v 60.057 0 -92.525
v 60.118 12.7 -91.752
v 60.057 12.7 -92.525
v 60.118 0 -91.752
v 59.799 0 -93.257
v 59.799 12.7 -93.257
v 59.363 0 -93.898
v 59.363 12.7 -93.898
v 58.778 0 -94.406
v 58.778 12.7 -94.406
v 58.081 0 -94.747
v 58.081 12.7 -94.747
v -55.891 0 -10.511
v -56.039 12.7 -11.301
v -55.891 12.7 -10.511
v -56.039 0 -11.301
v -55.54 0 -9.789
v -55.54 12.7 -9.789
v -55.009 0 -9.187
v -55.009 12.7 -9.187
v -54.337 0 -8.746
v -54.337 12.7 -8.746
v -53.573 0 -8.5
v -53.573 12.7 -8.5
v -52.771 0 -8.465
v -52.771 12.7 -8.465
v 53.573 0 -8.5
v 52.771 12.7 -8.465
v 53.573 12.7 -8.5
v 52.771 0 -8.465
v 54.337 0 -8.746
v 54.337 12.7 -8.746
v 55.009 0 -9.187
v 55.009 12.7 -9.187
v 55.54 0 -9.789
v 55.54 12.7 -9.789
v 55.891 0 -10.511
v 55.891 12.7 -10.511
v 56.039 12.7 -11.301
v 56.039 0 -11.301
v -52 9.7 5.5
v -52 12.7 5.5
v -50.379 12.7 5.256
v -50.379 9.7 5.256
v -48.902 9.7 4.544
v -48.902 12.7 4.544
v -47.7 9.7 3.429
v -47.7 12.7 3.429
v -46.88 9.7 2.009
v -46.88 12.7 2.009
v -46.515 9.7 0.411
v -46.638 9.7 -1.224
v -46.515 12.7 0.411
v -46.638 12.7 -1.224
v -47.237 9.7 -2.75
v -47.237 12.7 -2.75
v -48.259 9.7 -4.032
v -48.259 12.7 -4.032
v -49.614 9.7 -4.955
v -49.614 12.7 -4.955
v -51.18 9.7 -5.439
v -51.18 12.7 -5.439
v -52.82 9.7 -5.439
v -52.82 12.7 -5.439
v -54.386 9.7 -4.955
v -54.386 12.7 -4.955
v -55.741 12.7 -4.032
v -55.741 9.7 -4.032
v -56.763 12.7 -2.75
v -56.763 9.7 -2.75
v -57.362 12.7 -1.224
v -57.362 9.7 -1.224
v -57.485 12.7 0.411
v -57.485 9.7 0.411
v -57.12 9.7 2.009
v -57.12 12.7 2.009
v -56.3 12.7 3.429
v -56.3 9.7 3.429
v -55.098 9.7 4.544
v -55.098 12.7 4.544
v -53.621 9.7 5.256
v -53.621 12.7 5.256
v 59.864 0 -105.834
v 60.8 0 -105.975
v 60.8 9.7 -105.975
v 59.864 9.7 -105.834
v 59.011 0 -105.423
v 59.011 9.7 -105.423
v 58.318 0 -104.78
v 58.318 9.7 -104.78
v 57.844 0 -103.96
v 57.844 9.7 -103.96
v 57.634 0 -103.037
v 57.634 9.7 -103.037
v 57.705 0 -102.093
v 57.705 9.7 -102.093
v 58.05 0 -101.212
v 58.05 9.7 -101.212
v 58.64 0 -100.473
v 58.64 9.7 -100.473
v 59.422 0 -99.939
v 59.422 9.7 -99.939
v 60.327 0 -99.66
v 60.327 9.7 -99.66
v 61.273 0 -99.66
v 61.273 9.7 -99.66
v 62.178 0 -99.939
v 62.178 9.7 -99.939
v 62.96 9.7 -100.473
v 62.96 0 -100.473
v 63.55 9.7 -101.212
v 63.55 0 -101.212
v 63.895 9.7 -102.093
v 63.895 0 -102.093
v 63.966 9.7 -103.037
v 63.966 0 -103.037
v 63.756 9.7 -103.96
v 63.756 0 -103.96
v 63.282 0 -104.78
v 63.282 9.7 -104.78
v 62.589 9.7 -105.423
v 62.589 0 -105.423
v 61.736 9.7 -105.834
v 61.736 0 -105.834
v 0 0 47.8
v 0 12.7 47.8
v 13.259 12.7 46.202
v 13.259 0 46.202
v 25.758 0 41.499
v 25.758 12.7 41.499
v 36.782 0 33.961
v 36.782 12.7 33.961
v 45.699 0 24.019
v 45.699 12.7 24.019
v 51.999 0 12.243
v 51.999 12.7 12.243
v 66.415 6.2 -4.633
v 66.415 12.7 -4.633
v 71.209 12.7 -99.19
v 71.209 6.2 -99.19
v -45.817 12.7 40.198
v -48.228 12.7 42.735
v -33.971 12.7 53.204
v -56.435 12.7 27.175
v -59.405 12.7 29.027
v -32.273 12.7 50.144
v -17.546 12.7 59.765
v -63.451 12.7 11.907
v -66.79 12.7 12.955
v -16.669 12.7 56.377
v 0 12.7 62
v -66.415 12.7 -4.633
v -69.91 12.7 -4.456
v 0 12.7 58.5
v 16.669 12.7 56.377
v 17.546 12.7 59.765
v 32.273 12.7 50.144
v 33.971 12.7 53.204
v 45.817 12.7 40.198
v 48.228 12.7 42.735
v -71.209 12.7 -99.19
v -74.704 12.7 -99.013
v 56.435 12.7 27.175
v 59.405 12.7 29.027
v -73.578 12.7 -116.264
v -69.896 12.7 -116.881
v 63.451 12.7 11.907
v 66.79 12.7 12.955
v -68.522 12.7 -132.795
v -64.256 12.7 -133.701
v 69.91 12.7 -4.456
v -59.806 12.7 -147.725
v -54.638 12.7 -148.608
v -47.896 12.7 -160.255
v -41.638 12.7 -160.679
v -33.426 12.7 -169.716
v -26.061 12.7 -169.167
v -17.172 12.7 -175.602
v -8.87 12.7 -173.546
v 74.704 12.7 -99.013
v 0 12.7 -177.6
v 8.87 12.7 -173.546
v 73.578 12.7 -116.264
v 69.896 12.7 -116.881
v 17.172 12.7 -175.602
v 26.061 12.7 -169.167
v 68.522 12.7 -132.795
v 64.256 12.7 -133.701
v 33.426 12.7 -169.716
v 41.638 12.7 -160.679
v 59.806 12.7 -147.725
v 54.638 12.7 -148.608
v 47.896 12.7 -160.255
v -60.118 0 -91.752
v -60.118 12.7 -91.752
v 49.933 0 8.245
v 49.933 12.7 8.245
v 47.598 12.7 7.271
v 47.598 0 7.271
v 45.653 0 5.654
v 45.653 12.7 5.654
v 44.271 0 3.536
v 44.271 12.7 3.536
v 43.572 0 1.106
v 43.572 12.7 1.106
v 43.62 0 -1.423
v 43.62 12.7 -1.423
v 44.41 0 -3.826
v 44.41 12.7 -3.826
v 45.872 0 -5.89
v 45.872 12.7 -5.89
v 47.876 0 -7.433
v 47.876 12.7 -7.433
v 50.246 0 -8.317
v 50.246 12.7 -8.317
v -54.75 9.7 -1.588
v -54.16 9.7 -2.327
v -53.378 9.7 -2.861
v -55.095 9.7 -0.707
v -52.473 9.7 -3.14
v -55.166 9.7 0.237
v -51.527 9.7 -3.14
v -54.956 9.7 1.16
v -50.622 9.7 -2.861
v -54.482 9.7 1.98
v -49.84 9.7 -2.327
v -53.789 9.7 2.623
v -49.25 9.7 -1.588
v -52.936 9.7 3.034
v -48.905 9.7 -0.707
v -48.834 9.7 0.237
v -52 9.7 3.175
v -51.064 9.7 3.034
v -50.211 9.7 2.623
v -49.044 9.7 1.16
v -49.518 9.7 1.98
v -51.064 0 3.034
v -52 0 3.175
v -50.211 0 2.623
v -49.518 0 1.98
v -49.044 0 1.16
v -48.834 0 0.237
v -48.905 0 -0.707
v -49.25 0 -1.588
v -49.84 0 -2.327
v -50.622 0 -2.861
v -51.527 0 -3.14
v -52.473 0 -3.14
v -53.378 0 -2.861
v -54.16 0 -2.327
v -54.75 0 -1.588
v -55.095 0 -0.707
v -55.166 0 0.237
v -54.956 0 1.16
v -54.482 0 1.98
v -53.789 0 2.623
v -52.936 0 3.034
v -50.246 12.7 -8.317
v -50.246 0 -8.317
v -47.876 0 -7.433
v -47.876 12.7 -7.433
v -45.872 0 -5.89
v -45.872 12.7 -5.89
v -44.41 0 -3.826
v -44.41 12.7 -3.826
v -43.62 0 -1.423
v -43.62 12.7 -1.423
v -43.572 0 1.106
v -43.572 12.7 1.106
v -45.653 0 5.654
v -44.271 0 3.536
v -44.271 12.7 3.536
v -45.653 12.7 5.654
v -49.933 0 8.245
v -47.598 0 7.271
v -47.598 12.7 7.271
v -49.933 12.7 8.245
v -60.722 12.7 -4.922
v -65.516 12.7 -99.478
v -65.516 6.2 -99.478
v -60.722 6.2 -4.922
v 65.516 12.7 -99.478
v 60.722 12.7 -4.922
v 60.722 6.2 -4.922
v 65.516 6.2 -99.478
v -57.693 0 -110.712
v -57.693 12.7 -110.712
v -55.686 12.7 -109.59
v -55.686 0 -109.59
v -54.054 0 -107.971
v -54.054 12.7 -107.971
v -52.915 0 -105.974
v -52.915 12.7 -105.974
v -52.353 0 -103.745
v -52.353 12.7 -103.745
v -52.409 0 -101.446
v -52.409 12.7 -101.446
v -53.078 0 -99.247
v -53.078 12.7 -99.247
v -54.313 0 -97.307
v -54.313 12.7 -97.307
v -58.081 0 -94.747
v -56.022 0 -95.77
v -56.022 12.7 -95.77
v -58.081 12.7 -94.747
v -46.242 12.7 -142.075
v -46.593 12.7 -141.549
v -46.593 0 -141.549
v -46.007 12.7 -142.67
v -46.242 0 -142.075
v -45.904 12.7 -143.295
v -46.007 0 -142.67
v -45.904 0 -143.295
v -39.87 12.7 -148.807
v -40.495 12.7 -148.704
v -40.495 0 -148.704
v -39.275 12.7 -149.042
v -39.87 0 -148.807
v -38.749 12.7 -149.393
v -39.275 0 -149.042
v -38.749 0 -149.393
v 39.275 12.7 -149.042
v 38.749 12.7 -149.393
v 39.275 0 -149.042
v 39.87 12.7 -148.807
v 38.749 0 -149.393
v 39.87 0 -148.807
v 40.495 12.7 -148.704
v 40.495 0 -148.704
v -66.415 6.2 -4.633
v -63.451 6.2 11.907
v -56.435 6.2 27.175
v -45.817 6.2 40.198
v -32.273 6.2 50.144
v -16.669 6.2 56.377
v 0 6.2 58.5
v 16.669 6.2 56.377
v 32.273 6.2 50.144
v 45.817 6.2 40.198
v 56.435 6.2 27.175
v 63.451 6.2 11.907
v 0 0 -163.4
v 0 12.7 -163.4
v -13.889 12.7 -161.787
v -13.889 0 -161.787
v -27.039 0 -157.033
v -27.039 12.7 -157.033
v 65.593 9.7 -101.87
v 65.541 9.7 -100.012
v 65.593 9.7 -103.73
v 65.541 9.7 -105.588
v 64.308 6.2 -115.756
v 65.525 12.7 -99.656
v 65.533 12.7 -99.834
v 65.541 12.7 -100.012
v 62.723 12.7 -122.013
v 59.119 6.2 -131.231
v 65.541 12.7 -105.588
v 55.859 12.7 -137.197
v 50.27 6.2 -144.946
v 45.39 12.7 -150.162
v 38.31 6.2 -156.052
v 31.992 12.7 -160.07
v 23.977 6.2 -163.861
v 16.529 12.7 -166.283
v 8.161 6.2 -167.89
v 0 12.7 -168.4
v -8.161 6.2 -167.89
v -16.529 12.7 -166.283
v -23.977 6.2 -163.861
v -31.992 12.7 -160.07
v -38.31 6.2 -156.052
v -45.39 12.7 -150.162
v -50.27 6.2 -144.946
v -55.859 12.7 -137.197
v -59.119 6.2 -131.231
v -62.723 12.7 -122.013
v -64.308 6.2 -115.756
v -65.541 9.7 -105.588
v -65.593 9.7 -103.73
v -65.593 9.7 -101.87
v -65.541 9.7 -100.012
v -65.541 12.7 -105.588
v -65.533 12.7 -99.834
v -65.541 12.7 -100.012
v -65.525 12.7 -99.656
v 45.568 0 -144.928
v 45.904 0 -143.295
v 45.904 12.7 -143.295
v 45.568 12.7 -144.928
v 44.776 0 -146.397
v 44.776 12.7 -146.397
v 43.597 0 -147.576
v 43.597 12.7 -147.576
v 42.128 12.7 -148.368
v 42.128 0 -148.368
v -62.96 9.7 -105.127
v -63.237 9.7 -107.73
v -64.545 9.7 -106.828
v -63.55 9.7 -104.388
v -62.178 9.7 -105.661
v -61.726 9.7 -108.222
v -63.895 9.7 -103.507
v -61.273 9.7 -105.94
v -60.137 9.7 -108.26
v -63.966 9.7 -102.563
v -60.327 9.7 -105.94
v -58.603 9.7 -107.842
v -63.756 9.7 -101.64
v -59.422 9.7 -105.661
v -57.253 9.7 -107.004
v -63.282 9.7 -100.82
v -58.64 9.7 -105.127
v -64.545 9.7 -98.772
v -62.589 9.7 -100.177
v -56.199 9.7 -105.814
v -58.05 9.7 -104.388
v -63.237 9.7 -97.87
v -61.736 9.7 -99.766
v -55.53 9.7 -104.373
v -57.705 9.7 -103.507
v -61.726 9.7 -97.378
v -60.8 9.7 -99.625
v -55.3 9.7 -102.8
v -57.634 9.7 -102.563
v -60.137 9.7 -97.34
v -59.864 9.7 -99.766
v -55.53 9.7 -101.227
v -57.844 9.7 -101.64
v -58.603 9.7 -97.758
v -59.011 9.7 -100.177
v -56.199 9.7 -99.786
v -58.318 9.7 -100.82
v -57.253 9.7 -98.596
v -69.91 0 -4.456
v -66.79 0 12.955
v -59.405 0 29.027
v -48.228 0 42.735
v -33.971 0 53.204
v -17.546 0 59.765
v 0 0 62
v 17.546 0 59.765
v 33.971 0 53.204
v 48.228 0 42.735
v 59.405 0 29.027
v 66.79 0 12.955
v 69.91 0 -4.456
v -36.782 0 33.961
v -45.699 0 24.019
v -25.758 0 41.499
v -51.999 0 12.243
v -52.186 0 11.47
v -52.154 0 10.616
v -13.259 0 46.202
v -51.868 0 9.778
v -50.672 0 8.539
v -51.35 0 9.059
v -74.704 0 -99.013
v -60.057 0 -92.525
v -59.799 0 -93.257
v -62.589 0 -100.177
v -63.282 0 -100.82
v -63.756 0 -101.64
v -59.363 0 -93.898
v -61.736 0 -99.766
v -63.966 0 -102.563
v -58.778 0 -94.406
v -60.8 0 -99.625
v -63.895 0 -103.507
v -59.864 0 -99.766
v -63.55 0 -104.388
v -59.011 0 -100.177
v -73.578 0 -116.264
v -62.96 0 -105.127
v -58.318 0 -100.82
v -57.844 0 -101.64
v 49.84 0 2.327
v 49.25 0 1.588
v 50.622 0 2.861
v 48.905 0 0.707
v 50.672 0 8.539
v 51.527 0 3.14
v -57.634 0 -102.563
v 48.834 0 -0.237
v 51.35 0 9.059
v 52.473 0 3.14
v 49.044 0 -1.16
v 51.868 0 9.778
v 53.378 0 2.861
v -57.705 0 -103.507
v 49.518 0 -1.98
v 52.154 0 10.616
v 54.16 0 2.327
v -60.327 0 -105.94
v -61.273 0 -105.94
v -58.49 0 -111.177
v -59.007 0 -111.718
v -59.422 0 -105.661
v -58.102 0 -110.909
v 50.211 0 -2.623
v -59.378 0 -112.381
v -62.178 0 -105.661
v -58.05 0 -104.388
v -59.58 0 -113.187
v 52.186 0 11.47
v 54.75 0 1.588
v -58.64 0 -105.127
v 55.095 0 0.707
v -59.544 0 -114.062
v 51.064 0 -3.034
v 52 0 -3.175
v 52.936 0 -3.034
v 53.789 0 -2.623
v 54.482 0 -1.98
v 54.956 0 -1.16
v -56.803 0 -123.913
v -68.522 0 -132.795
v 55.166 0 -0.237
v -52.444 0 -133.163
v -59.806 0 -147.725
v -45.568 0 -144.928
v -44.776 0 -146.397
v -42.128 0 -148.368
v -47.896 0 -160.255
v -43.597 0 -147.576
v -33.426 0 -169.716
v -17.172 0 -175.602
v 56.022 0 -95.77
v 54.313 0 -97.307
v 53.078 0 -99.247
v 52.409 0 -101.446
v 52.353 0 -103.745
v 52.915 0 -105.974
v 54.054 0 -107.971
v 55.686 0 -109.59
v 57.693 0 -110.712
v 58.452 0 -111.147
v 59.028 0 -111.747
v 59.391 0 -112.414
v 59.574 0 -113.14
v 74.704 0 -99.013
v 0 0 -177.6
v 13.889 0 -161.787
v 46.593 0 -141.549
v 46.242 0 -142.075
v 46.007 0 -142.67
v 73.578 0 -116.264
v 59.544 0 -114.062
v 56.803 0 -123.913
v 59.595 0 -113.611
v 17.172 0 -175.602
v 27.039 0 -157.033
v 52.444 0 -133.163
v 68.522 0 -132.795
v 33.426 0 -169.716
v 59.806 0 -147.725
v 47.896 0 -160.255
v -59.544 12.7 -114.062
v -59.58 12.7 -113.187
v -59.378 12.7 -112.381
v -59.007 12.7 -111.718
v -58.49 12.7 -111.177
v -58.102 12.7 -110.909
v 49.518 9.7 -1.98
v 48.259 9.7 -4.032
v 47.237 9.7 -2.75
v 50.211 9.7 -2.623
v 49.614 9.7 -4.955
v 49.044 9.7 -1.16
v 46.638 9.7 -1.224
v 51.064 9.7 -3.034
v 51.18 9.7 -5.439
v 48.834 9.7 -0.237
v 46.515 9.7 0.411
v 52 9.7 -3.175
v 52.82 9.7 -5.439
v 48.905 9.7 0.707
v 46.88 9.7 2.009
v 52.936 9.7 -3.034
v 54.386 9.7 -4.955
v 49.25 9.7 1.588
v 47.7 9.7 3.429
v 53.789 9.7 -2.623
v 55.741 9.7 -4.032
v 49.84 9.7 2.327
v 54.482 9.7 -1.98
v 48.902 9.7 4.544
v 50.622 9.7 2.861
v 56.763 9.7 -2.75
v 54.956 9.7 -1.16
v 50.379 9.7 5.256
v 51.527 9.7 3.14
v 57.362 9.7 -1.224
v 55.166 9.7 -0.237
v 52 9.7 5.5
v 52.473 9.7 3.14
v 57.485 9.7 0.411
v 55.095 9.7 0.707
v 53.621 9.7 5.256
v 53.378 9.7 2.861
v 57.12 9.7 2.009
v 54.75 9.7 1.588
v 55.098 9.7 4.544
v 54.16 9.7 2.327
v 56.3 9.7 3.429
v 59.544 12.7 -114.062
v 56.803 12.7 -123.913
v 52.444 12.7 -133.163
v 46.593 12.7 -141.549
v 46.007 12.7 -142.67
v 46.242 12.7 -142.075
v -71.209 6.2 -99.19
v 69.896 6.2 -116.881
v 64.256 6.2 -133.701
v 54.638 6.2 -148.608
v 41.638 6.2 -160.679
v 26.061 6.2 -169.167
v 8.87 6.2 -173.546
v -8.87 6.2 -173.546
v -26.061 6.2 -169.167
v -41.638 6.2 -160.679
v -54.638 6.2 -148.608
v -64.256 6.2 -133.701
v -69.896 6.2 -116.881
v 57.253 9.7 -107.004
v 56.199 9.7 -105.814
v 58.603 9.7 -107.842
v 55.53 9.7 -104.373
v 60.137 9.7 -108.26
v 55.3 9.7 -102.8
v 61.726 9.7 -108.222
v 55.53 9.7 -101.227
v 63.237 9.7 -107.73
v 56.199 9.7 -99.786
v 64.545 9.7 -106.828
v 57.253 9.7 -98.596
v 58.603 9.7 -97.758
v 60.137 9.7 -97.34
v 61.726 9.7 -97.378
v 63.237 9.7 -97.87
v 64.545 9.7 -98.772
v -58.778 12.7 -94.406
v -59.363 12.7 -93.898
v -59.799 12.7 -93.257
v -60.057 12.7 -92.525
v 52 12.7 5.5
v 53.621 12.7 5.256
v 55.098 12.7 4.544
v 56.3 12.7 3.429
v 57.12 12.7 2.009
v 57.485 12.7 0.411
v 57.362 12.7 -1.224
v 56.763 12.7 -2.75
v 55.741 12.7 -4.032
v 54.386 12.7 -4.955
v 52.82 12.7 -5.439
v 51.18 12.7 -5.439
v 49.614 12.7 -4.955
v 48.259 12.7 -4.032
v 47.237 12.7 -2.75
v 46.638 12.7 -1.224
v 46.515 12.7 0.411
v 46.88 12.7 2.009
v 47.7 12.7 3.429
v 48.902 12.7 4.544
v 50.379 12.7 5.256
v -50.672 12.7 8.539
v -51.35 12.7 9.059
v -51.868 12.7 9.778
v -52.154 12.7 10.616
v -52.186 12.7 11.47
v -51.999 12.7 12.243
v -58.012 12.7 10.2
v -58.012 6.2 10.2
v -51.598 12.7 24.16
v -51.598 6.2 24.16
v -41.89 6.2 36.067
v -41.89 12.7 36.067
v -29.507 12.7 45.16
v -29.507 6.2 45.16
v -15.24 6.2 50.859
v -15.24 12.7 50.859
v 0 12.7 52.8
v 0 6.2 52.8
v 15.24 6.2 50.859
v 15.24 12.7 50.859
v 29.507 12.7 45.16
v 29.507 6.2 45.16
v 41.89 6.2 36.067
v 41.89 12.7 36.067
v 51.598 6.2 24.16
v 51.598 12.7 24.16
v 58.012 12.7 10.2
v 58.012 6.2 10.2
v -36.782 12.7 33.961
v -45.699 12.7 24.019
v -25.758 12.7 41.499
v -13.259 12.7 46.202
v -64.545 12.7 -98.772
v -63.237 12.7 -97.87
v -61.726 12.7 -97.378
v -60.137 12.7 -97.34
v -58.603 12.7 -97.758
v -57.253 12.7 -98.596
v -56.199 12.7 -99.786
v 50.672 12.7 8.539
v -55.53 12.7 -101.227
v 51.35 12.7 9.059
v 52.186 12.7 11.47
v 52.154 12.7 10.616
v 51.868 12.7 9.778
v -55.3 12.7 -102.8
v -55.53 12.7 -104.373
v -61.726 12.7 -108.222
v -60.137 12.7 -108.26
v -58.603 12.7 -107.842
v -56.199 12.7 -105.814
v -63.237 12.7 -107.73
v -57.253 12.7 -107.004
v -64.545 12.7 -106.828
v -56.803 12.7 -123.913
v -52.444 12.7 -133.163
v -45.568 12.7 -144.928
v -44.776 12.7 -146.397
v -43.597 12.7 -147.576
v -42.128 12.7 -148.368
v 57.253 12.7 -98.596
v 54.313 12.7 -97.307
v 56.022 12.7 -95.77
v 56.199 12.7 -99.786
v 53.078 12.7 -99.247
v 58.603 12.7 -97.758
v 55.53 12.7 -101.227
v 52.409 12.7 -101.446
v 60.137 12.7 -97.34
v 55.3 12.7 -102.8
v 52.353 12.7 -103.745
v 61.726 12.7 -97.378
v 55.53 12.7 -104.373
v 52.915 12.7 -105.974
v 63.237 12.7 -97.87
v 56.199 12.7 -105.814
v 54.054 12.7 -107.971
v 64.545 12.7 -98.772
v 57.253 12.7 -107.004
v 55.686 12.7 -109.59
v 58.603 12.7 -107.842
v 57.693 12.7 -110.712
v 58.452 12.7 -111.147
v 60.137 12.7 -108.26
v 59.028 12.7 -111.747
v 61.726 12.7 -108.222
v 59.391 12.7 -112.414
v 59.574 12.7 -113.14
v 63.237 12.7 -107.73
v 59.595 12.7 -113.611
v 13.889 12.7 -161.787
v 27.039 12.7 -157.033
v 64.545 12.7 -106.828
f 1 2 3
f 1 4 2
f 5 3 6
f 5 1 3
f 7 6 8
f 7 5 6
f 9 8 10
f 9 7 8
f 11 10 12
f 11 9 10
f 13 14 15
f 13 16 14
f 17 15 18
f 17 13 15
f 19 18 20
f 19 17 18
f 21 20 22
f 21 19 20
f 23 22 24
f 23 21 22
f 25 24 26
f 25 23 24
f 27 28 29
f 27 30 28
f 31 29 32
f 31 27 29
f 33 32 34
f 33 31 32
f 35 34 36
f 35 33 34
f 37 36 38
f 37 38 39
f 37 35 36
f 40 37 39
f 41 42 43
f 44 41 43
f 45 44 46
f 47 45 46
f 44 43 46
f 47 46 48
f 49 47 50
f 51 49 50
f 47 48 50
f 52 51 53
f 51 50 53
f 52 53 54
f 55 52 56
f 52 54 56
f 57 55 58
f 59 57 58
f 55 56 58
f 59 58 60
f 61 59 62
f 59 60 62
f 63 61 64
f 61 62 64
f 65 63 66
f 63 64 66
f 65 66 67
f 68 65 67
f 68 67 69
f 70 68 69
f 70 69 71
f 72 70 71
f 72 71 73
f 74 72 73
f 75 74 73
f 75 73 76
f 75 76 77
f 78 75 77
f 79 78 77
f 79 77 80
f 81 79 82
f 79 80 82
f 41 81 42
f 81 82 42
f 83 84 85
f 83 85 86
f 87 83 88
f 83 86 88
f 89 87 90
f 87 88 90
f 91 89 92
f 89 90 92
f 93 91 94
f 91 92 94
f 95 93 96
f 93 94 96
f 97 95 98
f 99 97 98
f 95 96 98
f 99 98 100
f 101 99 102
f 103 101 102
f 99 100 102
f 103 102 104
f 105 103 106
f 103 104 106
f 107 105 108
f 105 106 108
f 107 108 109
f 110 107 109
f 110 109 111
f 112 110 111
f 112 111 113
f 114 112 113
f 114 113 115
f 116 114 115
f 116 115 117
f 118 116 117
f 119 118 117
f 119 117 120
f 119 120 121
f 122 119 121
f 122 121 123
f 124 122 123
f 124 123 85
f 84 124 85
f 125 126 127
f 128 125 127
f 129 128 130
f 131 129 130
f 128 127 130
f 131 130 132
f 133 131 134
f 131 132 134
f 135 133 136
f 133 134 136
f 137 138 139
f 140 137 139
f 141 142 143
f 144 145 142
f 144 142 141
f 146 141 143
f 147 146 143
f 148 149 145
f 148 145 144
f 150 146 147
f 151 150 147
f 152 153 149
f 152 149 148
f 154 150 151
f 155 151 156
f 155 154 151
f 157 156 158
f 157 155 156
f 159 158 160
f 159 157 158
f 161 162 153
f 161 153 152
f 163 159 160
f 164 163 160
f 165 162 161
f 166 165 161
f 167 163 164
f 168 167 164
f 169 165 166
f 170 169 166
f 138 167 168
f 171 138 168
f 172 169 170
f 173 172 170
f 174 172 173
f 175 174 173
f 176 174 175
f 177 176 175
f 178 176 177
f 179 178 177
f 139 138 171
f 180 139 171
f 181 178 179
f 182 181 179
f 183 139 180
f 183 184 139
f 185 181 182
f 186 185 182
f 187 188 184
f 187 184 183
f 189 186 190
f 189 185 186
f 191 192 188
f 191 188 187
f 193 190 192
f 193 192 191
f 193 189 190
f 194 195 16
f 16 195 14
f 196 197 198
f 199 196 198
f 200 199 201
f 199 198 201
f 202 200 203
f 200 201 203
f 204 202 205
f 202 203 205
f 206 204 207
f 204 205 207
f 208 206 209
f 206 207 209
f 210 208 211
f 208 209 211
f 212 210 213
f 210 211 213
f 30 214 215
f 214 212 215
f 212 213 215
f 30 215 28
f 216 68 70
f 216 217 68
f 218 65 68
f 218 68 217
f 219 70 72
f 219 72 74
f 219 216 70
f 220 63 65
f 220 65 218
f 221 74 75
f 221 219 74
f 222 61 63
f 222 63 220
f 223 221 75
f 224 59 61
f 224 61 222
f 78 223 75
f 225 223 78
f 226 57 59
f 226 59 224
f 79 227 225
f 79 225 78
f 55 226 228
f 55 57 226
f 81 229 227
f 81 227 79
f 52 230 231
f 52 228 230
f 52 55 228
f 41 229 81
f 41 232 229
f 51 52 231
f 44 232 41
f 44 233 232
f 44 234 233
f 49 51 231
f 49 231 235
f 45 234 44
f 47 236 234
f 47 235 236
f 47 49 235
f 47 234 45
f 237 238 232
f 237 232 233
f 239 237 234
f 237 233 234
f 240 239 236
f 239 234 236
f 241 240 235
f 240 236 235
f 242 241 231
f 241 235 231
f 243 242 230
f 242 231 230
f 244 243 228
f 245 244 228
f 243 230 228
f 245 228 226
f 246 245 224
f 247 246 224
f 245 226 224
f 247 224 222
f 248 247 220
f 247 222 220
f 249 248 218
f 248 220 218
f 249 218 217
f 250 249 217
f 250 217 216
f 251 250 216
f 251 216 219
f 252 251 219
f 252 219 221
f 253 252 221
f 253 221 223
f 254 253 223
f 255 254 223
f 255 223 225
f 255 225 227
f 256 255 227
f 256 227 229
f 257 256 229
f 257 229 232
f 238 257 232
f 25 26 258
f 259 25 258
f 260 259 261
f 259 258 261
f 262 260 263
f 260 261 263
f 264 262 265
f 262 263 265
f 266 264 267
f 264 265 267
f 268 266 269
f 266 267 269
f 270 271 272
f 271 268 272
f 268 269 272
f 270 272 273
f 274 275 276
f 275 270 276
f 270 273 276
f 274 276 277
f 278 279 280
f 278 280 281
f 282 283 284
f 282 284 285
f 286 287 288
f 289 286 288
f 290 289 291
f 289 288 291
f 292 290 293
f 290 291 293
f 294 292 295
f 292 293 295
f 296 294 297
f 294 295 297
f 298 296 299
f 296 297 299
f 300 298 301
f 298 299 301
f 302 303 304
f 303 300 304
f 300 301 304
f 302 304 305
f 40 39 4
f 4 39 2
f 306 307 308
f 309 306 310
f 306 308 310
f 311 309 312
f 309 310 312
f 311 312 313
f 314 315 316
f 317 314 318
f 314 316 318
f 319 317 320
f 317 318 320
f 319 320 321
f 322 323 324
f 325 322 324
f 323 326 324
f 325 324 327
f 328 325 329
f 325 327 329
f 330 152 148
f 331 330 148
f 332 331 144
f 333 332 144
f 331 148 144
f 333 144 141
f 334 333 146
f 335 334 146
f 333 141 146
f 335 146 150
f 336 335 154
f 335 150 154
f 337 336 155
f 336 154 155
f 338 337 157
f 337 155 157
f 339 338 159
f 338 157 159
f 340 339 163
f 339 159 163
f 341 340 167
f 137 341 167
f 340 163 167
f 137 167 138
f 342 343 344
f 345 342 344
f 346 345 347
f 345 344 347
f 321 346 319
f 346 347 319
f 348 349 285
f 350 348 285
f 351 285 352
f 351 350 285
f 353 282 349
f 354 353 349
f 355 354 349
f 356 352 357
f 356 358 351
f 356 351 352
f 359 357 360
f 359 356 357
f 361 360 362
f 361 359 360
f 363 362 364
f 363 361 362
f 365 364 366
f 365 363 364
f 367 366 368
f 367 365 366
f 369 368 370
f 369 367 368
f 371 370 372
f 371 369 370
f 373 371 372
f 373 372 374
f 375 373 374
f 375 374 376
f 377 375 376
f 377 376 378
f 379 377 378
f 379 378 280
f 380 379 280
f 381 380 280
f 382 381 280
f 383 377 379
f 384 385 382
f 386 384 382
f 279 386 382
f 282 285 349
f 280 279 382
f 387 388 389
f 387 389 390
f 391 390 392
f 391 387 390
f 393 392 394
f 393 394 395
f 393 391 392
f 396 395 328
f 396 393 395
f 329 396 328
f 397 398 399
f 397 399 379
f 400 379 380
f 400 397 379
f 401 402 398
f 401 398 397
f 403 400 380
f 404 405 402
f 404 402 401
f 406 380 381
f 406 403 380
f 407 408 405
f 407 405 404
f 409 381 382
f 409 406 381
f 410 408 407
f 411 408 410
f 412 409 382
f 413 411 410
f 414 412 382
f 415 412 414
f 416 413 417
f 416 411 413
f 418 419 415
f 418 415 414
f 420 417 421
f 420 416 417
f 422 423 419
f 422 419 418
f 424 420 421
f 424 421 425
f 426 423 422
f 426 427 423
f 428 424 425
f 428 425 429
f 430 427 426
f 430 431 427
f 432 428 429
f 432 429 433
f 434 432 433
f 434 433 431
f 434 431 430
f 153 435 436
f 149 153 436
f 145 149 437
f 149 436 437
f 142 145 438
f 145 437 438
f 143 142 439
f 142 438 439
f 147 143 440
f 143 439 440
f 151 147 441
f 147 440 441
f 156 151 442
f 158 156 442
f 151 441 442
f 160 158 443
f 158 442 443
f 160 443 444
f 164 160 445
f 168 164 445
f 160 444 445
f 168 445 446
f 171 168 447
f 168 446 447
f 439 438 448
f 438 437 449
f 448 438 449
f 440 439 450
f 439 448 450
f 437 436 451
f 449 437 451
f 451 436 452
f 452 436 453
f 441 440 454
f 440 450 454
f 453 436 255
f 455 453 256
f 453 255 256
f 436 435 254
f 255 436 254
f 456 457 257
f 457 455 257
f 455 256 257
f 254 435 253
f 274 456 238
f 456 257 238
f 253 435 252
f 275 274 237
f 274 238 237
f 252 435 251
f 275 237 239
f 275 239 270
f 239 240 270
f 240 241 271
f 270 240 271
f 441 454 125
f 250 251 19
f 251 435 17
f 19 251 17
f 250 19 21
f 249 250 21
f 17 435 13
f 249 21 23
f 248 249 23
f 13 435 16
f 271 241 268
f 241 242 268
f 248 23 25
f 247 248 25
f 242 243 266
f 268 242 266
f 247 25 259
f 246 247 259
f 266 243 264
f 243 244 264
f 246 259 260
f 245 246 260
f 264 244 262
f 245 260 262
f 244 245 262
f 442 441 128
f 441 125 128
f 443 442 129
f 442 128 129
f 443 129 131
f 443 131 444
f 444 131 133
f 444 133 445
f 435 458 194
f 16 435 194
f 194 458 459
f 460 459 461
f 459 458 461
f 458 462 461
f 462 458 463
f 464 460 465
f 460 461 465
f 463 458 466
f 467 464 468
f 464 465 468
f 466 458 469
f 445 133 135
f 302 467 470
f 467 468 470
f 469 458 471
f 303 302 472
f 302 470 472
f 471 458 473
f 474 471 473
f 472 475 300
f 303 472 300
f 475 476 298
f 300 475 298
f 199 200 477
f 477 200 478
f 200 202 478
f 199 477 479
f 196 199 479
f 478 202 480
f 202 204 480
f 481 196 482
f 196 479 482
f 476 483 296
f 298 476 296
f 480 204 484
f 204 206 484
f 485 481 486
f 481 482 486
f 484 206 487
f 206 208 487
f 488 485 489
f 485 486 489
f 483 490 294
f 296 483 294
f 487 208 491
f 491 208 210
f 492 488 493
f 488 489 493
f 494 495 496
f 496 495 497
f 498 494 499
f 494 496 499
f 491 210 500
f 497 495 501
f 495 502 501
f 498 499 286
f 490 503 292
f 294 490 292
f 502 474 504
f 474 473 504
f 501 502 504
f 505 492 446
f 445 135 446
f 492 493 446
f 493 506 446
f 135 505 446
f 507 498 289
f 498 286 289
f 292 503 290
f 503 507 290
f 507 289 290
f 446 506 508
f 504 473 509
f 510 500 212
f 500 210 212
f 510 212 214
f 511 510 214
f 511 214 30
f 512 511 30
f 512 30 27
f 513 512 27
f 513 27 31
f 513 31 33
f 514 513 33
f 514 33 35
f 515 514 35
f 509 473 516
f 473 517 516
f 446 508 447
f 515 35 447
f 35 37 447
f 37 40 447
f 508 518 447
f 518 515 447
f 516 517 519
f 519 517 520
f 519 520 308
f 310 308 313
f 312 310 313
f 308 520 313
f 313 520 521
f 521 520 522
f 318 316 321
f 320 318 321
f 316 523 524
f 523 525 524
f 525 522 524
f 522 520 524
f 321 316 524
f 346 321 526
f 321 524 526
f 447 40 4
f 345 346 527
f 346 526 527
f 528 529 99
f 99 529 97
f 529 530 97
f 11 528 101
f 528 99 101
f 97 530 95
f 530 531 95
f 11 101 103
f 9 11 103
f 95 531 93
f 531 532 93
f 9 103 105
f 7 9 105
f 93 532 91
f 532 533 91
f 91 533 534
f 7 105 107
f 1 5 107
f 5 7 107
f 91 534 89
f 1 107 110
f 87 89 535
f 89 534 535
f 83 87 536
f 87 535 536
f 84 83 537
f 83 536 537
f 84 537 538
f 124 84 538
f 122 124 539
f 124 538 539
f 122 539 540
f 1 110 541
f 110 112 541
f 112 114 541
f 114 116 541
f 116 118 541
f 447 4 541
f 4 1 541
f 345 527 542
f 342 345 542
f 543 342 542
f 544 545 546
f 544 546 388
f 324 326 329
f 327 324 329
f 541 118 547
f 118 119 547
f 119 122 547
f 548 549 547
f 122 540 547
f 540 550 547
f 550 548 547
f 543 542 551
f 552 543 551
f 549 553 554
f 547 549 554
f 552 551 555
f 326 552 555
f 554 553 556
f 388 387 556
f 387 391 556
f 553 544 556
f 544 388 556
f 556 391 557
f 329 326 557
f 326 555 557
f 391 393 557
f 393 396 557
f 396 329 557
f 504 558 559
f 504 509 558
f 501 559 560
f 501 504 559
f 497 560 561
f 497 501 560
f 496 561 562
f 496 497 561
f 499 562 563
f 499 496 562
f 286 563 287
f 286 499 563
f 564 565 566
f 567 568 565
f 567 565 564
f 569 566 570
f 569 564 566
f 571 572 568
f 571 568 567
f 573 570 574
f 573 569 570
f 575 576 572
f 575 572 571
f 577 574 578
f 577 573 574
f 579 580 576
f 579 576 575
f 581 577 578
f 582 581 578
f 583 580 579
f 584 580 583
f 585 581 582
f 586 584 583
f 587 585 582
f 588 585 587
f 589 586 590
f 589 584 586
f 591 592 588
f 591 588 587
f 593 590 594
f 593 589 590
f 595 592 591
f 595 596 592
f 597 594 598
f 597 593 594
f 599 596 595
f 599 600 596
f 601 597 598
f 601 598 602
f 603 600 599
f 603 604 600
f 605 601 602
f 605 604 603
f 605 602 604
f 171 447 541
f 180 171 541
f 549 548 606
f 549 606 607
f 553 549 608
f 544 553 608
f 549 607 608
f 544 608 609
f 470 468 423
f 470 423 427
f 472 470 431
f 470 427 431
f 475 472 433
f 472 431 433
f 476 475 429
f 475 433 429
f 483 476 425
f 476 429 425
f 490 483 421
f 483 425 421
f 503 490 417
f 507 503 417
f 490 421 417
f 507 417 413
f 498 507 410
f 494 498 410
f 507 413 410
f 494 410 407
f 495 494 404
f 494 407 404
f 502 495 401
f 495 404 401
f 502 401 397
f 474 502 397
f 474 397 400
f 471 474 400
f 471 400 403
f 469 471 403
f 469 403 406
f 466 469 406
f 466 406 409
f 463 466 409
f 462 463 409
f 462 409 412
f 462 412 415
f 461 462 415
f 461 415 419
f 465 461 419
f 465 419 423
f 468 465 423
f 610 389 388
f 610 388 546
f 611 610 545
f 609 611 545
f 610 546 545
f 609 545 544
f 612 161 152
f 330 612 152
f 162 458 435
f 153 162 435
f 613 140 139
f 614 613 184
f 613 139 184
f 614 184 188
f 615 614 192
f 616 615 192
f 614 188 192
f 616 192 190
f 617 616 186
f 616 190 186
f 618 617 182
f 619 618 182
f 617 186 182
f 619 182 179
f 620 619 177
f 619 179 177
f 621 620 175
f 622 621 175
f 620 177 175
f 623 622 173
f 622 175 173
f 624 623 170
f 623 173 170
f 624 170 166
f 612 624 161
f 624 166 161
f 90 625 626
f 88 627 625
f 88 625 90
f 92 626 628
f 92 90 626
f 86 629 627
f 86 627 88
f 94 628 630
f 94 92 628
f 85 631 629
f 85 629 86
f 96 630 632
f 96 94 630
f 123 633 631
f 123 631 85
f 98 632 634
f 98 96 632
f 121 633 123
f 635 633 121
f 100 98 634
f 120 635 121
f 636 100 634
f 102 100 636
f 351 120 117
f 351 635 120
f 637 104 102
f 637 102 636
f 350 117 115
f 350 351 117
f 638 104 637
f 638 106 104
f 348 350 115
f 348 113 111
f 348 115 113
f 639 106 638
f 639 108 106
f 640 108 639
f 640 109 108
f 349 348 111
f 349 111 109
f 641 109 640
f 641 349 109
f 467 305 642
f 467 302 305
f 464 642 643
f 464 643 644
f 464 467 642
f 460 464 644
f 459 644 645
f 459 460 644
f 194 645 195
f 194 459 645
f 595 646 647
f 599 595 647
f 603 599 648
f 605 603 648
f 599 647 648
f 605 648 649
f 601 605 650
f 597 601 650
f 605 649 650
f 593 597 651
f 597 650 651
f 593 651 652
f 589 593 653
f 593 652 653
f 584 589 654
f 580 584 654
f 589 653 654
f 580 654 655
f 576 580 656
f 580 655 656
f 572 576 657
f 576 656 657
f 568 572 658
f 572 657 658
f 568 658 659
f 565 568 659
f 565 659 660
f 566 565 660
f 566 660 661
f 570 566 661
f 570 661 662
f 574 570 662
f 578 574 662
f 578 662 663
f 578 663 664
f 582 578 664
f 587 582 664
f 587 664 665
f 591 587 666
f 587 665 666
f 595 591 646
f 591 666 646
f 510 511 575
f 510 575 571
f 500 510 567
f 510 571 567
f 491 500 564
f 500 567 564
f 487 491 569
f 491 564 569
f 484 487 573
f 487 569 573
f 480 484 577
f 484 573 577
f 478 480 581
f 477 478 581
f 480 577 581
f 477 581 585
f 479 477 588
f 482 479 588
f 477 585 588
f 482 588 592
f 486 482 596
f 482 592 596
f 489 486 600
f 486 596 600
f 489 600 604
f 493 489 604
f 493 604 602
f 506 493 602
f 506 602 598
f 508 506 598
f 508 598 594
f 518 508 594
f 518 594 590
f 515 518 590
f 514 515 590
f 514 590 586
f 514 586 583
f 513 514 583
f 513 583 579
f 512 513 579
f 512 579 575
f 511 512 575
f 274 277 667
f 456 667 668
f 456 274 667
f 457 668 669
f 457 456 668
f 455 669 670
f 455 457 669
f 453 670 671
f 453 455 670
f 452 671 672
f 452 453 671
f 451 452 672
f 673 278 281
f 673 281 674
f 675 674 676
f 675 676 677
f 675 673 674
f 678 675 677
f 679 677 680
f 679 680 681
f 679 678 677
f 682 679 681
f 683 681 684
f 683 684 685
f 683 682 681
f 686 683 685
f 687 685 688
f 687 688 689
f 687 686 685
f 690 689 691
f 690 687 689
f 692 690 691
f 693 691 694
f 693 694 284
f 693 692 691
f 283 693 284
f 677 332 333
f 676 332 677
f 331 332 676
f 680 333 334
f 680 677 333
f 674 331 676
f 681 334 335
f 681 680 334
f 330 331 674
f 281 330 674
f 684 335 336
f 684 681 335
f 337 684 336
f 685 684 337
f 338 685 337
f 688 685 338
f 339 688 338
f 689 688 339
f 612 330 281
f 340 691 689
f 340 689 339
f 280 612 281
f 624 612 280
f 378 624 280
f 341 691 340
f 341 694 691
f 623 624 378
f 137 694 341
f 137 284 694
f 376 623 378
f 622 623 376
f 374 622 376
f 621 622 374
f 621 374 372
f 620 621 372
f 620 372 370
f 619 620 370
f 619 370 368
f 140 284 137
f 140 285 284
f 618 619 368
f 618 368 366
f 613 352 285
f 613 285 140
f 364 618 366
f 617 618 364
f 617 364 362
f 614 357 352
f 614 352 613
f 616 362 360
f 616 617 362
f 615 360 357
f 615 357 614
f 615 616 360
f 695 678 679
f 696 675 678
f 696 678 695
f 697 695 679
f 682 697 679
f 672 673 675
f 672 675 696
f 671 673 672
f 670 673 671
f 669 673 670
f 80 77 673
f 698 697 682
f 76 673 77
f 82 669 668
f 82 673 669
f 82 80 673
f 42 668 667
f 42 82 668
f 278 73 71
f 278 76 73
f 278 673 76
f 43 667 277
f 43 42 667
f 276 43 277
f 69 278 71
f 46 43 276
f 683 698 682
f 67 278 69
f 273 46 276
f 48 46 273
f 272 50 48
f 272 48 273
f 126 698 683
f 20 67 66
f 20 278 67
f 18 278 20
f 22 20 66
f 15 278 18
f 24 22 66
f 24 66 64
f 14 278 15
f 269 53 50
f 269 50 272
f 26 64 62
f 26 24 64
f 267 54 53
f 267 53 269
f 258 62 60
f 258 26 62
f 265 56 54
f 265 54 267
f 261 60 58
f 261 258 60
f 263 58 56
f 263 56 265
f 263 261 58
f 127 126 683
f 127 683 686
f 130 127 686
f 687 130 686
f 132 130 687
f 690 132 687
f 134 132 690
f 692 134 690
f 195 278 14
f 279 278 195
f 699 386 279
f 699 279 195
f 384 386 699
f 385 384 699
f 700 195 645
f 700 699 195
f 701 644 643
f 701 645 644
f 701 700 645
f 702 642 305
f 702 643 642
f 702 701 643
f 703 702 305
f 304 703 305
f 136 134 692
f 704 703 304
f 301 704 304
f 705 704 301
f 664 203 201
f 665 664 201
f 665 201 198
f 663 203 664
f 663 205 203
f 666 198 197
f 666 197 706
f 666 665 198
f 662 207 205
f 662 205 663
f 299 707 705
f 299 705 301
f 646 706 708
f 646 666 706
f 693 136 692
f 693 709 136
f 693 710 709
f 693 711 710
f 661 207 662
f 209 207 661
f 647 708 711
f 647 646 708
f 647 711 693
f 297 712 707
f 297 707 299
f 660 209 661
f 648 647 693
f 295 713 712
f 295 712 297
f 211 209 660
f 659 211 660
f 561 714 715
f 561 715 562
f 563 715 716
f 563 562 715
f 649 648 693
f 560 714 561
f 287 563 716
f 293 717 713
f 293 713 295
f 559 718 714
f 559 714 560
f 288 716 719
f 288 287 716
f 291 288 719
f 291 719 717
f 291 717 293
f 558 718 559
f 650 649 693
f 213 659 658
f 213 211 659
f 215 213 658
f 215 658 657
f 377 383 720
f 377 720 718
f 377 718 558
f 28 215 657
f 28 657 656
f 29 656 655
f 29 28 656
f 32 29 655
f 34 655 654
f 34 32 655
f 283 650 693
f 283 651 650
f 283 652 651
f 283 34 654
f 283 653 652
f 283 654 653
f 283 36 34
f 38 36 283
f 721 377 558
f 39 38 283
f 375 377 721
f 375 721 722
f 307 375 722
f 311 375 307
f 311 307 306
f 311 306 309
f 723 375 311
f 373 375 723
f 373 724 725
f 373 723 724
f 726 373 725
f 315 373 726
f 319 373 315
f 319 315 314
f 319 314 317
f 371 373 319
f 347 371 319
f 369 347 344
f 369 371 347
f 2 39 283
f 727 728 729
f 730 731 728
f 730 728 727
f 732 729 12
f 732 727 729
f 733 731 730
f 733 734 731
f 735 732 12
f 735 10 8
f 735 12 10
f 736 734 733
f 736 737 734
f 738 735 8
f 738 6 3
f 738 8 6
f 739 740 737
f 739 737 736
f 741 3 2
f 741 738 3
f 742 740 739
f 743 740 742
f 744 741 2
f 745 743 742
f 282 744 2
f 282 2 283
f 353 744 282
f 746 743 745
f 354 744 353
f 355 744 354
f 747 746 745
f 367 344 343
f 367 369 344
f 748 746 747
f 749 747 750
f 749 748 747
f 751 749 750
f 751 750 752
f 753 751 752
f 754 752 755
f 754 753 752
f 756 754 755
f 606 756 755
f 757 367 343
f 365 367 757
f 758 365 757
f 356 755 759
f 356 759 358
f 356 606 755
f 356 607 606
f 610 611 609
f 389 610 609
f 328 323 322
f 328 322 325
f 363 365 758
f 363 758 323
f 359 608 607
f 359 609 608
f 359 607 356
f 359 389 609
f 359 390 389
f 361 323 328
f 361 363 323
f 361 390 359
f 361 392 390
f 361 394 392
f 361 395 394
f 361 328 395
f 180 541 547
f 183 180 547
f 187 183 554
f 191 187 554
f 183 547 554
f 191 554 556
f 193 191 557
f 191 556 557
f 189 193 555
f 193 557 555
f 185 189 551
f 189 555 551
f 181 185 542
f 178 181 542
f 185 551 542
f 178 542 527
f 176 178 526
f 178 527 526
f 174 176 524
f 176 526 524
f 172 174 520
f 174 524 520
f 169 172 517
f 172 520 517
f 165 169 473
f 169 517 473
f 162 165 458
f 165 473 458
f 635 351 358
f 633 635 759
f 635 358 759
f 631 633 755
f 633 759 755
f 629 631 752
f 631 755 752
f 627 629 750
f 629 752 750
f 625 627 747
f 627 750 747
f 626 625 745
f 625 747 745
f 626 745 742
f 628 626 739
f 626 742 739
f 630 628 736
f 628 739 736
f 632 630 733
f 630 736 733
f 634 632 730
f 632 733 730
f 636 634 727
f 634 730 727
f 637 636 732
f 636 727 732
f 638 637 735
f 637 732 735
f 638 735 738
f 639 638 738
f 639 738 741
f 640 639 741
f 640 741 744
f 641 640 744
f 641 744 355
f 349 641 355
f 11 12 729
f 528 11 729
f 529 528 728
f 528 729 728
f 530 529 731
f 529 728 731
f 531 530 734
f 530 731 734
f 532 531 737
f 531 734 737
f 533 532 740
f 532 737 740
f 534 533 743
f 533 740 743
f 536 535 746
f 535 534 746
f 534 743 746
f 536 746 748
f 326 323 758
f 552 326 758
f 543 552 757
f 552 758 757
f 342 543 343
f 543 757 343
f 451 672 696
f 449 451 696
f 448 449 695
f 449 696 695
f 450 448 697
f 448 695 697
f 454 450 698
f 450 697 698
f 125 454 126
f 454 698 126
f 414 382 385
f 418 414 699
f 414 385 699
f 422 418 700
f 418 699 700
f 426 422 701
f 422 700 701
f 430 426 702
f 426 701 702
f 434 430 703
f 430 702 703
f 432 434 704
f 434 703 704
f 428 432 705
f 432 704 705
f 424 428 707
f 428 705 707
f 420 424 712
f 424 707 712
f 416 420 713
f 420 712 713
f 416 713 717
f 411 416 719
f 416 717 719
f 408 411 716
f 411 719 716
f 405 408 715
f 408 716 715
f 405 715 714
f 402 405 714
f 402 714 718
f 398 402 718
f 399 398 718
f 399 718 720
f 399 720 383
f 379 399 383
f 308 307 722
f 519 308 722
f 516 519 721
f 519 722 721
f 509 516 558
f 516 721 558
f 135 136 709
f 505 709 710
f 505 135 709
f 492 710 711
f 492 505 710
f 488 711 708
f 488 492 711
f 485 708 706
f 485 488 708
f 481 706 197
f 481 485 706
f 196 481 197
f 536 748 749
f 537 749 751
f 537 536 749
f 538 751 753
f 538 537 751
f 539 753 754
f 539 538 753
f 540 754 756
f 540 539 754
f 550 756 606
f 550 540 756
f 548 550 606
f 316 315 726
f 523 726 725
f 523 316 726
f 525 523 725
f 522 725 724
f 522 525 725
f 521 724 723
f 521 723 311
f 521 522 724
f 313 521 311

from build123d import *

# Parameters (mm, degrees)
SKETCH1_R           = 40
SKETCH1_R_2         = 50.8
SKETCH1_R_3         = 5.75
BOSS_EXTRUDE1_DEPTH = 12.7
SKETCH10_R          = 3.175
CUT_EXTRUDE6_DEPTH  = 194.127134292
SKETCH12_R          = 5.5
CUT_EXTRUDE8_DEPTH  = 3
CUT_EXTRUDE9_DEPTH  = 6.5
CUT_EXTRUDE10_DEPTH = 194.127134292
FILLET1_R           = 3
FILLET2_R           = 3


with BuildPart() as part:
    # Sketch1 → Boss-Extrude1 (new body)
    with BuildSketch(Plane(origin=(0, 0, 0), x_dir=(1, 0, 0), z_dir=(0, 1, 0))):
        with BuildLine():
            Line((-74.704056398, 99.012658228), (-69.910213207, 4.455696203))
            ThreePointArc((-69.910213207, 4.455696203), (0, -62), (69.910213207, 4.455696203))
            Line((69.910213207, 4.455696203), (74.704056398, 99.012658228))
            ThreePointArc((74.704056398, 99.012658228), (0, 177.6), (-74.704056398, 99.012658228))
        make_face()
        with Locations(Location((0, 0, 0), (0, 0, 270))):
            Circle(SKETCH1_R, mode=Mode.SUBTRACT)
        with Locations(Location((0, 102.8, 0), (0, 0, 270))):
            Circle(SKETCH1_R_2, mode=Mode.SUBTRACT)
        with Locations(Location((40.163665171, 142.963665171, 0), (0, 0, 270))):
            Circle(SKETCH1_R_3, mode=Mode.SUBTRACT)
        with Locations(Location((40.163665171, 62.636334829, 0), (0, 0, 270))):
            Circle(SKETCH1_R_3, mode=Mode.SUBTRACT)
        with Locations(Location((-40.163665171, 62.636334829, 0), (0, 0, 270))):
            Circle(SKETCH1_R_3, mode=Mode.SUBTRACT)
        with Locations(Location((-40.163665171, 142.963665171, 0), (0, 0, 270))):
            Circle(SKETCH1_R_3, mode=Mode.SUBTRACT)
    extrude(amount=BOSS_EXTRUDE1_DEPTH)

    # Sketch10 → Cut-Extrude6 (cut, through all)
    with BuildSketch(Plane(origin=(0, 12.7, 0), x_dir=(1, 0, 0), z_dir=(0, 1, 0))):
        with Locations(Location((-52, 0, 0), (0, 0, 270))):
            Circle(SKETCH10_R)
        with Locations(Location((-60.8, 102.8, 0), (0, 0, 270))):
            Circle(SKETCH10_R)
        with Locations(Location((60.8, 102.8, 0), (0, 0, 90))):
            Circle(SKETCH10_R)
        with Locations(Location((52, 0, 0), (0, 0, 90))):
            Circle(SKETCH10_R)
    extrude(amount=-CUT_EXTRUDE6_DEPTH, mode=Mode.SUBTRACT)

    # Sketch12 → Cut-Extrude8 (cut)
    with BuildSketch(Plane(origin=(0, 12.7, 0), x_dir=(1, 0, 0), z_dir=(0, 1, 0))):
        with Locations(Location((-60.8, 102.8, 0), (0, 0, 270))):
            Circle(SKETCH12_R)
        with Locations(Location((60.8, 102.8, 0), (0, 0, 270))):
            Circle(SKETCH12_R)
        with Locations(Location((52, 0, 0), (0, 0, 270))):
            Circle(SKETCH12_R)
        with Locations(Location((-52, 0, 0), (0, 0, 270))):
            Circle(SKETCH12_R)
    extrude(amount=-CUT_EXTRUDE8_DEPTH, mode=Mode.SUBTRACT)

    # Sketch13 → Cut-Extrude9 (cut)
    with BuildSketch(Plane(origin=(0, 12.7, 0), x_dir=(1, 0, 0), z_dir=(0, 1, 0))):
        with BuildLine():
            Line((-71.208545738, 99.189873418), (-66.414702546, 4.632911392))
            ThreePointArc((-66.414702546, 4.632911392), (0, -58.5), (66.414702546, 4.632911392))
            Line((66.414702546, 4.632911392), (71.208545738, 99.189873418))
            ThreePointArc((71.208545738, 99.189873418), (0, 174.1), (-71.208545738, 99.189873418))
        make_face()
        with BuildLine():
            Line((-65.515856948, 99.478481013), (-60.722013757, 4.921518987))
            ThreePointArc((-60.722013757, 4.921518987), (0, -52.8), (60.722013757, 4.921518987))
            Line((60.722013757, 4.921518987), (65.515856948, 99.478481013))
            ThreePointArc((65.515856948, 99.478481013), (0, 168.4), (-65.515856948, 99.478481013))
        make_face(mode=Mode.SUBTRACT)
    extrude(amount=-CUT_EXTRUDE9_DEPTH, mode=Mode.SUBTRACT)

    # Sketch14 → Cut-Extrude10 (cut, through all)
    with BuildSketch(Plane(origin=(0, 12.7, 0), x_dir=(1, 0, 0), z_dir=(0, 1, 0))):
        with BuildLine():
            Line((-60.247807343, 94.317955242), (-55.850268123, 7.577957204))
            ThreePointArc((-55.850268123, 7.577957204), (-43.603288319, 1.321072649), (-53.33734455, -8.394135426))
            ThreePointArc((-53.33734455, -8.394135426), (-33.157557534, -36.880022041), (0, -47.8))
            ThreePointArc((0, -47.8), (33.157557534, -36.880022041), (53.33734455, -8.394135426))
            ThreePointArc((53.33734455, -8.394135426), (43.603288319, 1.321072649), (55.850268123, 7.577957204))
            Line((55.850268123, 7.577957204), (60.247807343, 94.317955242))
            ThreePointArc((60.247807343, 94.317955242), (52.300864134, 102.678799624), (60.006167763, 111.262850015))
            ThreePointArc((60.006167763, 111.262850015), (39.746139995, 148.544992682), (0, 163.4))
            ThreePointArc((0, 163.4), (-39.746139995, 148.544992682), (-60.006167763, 111.262850015))
            ThreePointArc((-60.006167763, 111.262850015), (-52.300864134, 102.678799624), (-60.247807343, 94.317955242))
        make_face()
    extrude(amount=-CUT_EXTRUDE10_DEPTH, mode=Mode.SUBTRACT)

    # Fillet1
    fillet1_edges = [part.edges().sort_by_distance(p)[0] for p in [
        (-60.006167763, 6.35, -111.262850015),
        (-53.33734455, 6.35, 8.394135426),
        (-55.850268123, 6.35, -7.577957204),
        (-60.247807343, 6.35, -94.317955242),
        (60.006167763, 6.35, -111.262850015),
        (60.247807343, 6.35, -94.317955242),
        (55.850268123, 6.35, -7.577957204),
        (53.33734455, 6.35, 8.394135426),
    ]]
    fillet(fillet1_edges, radius=FILLET1_R)

    # Fillet2
    fillet2_edges = [part.edges().sort_by_distance(p)[0] for p in [
        (-39.585032528, 6.35, -148.684476675),
        (-45.884476675, 6.35, -142.385032528),
        (39.585032528, 6.35, -148.684476675),
        (45.884476675, 6.35, -142.385032528),
    ]]
    fillet(fillet2_edges, radius=FILLET2_R)


solid = part.part
